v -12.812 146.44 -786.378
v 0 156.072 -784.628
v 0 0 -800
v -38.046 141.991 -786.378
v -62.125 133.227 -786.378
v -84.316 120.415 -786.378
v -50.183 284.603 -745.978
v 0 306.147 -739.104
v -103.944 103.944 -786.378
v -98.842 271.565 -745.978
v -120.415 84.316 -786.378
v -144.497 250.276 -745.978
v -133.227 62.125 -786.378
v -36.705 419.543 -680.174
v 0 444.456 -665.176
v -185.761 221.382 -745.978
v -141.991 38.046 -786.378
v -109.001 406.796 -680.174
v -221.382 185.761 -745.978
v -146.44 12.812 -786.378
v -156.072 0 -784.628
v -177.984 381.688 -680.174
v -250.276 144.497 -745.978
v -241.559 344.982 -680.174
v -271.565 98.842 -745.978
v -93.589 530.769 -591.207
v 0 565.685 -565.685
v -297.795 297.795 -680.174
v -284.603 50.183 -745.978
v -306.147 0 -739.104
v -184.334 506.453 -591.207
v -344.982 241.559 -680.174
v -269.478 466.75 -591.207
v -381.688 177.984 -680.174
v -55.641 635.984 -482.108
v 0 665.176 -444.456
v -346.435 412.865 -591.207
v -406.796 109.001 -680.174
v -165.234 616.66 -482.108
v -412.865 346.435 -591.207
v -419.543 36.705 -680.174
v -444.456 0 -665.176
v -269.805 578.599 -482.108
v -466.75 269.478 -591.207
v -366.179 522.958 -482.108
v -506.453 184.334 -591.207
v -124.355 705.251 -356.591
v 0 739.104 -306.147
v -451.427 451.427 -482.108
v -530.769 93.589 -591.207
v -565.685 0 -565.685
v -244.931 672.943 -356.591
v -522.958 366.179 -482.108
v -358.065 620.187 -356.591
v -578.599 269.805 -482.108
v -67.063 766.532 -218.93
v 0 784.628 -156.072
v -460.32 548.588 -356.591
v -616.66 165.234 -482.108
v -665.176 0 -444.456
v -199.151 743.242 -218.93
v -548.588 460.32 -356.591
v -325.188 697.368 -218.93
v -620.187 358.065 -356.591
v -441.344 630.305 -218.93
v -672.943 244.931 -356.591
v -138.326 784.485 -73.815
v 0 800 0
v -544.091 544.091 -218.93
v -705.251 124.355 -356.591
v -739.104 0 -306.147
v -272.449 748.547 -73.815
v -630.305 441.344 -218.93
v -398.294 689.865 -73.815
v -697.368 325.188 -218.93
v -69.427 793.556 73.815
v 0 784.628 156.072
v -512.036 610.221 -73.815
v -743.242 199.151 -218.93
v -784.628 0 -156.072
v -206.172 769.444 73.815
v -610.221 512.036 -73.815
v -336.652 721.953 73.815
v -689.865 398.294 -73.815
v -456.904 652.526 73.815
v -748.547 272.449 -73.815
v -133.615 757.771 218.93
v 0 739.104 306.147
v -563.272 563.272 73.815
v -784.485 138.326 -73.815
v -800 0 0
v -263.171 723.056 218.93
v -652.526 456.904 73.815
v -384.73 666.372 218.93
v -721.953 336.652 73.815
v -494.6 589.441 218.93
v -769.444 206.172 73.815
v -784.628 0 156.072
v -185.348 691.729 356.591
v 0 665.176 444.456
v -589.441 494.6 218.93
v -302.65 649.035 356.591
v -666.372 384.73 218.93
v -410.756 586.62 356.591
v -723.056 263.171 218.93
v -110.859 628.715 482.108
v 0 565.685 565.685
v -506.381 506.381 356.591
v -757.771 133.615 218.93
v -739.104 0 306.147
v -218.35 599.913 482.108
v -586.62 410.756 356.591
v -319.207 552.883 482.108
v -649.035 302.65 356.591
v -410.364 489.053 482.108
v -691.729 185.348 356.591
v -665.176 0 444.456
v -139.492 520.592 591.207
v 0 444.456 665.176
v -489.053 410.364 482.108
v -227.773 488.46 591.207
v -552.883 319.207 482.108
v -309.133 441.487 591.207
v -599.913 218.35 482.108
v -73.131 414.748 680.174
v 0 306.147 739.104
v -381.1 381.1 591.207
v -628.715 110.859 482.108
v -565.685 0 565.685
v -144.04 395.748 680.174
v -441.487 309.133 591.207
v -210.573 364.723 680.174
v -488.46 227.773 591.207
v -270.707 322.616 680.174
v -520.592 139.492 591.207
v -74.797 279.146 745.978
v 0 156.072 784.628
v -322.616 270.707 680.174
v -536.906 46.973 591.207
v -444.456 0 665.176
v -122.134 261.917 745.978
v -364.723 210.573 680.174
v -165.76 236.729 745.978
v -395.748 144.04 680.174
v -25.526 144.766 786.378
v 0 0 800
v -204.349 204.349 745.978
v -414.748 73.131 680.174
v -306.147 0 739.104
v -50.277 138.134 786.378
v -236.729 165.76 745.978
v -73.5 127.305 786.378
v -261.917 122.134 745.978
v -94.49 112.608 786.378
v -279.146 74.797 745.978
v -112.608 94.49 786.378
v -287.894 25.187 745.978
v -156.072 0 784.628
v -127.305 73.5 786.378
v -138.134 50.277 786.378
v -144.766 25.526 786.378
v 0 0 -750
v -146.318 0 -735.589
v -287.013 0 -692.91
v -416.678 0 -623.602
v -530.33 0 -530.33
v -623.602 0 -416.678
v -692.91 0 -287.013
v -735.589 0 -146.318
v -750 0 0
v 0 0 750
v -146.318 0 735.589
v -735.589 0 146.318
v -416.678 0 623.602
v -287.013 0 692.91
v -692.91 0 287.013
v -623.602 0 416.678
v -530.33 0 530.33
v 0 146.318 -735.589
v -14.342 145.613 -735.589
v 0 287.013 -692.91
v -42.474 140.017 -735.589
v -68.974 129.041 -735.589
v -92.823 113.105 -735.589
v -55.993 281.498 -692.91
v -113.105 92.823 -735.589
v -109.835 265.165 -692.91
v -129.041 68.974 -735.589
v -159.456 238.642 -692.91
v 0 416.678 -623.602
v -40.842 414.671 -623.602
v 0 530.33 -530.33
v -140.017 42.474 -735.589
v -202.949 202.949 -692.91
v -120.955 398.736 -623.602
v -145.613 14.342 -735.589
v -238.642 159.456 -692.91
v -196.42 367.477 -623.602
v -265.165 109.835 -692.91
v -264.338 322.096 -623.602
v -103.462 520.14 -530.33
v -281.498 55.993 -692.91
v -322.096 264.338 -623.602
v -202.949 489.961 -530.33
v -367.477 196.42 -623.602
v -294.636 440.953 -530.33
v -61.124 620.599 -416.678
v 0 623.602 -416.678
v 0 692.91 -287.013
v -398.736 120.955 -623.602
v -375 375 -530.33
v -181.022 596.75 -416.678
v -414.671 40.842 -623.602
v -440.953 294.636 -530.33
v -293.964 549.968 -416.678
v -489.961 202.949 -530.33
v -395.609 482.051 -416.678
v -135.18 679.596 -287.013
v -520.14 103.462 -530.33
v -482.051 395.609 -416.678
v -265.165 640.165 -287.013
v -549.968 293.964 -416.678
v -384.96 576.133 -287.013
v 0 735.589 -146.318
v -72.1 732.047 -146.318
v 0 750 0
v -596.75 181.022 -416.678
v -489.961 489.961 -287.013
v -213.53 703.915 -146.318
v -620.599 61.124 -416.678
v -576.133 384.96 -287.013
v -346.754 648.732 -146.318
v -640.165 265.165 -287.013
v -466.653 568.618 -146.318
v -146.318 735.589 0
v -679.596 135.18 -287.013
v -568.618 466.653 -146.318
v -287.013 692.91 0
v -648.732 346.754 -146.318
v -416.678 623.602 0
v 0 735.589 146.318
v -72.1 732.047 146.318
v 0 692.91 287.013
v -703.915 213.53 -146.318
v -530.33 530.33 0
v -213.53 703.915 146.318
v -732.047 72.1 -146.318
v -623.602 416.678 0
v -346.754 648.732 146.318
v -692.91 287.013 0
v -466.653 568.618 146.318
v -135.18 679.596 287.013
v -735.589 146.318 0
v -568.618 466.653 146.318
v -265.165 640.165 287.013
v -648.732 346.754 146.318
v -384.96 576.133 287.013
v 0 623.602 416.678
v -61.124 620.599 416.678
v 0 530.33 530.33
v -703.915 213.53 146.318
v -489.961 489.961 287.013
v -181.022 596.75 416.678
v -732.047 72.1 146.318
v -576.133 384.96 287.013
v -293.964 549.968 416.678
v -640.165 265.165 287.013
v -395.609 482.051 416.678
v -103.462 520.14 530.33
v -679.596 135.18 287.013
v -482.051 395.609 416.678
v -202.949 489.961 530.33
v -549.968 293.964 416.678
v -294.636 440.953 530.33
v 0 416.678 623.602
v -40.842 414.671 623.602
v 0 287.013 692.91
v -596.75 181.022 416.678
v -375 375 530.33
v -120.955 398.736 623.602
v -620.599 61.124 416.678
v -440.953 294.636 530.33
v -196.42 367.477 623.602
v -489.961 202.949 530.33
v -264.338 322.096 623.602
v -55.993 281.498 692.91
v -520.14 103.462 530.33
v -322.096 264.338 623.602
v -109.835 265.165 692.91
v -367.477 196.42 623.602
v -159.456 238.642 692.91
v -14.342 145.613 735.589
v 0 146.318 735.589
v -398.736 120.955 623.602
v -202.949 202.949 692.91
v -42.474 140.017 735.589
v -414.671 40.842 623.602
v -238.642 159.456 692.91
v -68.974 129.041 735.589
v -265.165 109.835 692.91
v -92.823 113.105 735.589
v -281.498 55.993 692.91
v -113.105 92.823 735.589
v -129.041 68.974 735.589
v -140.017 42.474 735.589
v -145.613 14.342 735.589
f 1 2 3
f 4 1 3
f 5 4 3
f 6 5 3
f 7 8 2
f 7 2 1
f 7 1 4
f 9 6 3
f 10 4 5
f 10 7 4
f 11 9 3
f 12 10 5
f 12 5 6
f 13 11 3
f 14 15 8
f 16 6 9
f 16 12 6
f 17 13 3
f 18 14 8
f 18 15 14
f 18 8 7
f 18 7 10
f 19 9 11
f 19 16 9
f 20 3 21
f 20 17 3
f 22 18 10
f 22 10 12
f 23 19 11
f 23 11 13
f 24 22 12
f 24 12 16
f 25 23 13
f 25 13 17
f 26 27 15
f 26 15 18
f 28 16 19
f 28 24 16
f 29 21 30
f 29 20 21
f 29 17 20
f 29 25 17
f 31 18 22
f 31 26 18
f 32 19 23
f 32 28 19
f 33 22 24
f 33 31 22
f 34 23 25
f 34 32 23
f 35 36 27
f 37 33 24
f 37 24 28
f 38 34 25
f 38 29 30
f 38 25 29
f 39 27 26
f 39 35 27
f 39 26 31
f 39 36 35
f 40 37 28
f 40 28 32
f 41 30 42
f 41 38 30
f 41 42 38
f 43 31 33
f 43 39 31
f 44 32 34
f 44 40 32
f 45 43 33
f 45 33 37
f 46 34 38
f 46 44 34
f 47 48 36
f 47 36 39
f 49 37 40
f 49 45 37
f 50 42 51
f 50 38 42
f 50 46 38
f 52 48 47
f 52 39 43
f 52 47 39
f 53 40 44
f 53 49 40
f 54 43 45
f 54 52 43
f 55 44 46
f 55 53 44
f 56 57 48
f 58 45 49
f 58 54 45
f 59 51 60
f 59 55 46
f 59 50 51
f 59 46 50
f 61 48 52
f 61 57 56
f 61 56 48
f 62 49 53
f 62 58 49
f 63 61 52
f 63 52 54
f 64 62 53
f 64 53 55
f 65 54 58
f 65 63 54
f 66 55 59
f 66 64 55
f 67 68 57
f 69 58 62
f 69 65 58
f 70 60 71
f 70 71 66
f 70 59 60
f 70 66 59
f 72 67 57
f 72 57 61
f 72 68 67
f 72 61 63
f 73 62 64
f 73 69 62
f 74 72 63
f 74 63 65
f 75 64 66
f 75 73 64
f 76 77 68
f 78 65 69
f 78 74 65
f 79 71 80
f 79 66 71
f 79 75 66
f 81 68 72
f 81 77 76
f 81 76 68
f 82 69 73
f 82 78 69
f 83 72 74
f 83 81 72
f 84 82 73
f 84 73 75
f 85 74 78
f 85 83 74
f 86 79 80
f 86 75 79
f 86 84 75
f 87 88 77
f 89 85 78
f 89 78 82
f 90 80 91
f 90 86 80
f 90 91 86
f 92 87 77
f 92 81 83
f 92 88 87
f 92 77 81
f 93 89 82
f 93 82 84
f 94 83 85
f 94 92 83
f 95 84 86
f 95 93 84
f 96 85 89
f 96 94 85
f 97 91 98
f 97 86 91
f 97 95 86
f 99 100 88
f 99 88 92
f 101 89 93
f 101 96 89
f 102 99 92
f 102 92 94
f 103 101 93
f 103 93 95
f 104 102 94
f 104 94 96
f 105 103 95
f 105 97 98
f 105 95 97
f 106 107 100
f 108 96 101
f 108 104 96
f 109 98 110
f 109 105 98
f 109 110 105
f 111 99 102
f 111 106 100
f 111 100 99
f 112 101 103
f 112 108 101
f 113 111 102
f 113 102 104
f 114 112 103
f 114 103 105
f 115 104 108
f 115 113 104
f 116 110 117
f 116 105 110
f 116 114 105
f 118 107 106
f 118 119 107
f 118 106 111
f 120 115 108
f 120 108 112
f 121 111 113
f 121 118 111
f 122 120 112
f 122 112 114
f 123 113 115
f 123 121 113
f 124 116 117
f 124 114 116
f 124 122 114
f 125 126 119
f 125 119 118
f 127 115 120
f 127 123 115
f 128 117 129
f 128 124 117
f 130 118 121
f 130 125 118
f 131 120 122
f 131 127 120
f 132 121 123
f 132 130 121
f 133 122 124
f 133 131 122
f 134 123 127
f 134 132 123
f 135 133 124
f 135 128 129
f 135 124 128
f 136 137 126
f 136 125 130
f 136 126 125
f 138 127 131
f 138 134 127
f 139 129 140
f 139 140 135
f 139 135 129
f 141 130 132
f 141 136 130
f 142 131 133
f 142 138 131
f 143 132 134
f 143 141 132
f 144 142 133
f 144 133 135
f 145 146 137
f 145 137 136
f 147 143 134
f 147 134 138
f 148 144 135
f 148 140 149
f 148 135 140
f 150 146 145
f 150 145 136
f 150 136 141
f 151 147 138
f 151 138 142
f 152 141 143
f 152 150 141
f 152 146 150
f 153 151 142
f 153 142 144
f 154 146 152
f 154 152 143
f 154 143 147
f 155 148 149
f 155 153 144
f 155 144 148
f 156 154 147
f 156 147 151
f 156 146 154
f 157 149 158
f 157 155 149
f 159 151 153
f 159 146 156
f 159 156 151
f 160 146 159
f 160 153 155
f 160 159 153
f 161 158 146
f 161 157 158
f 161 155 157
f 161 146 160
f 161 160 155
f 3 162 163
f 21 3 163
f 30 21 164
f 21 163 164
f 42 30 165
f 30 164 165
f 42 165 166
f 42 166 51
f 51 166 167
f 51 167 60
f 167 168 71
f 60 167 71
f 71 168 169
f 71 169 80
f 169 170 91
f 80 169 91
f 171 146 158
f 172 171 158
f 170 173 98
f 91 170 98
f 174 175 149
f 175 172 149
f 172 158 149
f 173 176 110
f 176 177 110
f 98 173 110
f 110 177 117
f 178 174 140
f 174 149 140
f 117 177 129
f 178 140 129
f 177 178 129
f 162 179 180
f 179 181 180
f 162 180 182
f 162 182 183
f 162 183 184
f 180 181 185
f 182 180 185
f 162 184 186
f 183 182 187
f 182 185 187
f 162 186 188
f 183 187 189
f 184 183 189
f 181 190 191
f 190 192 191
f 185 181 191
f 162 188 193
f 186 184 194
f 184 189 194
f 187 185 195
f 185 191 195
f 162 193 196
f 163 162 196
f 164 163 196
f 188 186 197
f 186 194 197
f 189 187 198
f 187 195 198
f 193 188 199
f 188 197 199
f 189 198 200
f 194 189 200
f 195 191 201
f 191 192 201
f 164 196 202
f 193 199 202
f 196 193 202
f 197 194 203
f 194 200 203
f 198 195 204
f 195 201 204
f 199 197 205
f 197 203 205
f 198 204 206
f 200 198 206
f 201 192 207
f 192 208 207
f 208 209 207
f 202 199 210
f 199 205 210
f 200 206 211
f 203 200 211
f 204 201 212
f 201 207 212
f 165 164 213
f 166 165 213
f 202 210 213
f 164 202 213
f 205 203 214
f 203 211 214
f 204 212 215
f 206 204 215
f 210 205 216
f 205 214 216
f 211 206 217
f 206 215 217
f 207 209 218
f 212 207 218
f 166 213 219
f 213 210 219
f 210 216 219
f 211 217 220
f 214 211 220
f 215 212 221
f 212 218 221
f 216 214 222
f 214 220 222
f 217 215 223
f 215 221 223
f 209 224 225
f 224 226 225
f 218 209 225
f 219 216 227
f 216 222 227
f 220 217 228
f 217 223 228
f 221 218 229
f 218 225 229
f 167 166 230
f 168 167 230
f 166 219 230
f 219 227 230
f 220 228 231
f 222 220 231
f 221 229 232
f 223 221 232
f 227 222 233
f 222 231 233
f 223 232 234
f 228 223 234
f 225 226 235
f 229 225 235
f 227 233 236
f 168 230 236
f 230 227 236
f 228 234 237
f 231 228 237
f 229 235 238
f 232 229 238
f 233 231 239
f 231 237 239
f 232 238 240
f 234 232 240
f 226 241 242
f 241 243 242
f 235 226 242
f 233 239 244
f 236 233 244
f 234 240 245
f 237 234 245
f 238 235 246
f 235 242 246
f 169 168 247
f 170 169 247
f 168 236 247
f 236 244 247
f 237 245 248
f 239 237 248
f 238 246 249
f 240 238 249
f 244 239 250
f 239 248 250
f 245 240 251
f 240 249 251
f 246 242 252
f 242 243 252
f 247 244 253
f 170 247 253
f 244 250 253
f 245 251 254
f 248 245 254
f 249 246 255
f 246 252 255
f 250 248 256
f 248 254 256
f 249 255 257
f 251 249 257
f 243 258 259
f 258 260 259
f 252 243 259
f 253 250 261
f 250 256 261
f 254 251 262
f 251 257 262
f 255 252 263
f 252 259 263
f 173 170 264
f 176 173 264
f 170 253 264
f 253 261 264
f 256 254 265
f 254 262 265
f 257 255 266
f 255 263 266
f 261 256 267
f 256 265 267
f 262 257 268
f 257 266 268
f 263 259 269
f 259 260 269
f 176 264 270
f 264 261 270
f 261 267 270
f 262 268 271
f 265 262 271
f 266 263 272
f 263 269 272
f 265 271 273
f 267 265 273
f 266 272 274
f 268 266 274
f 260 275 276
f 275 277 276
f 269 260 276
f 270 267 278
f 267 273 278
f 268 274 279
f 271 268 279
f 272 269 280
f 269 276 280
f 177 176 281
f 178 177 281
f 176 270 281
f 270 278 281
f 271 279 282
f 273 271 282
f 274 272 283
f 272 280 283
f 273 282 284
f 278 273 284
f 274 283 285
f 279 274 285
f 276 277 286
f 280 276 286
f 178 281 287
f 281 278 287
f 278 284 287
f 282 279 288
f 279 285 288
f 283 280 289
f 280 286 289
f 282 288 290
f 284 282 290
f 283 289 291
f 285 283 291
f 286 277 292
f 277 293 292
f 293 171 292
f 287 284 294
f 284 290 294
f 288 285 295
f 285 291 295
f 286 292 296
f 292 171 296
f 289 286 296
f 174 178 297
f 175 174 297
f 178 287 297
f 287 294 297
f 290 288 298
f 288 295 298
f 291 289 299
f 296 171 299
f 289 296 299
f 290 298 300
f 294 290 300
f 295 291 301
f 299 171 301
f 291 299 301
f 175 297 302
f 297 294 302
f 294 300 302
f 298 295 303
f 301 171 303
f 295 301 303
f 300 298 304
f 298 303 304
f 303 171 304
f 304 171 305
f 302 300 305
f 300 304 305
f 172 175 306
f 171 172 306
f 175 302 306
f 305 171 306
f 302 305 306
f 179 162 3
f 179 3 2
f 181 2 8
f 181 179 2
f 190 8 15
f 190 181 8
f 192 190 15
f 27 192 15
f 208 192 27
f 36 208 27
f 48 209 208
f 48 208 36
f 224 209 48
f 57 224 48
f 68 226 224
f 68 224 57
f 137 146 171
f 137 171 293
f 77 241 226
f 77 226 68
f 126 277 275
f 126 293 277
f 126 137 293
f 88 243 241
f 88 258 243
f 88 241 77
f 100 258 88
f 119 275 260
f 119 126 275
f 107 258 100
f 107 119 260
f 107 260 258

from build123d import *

# Parameters (mm, degrees)
SPHERE001_ANGLE           = 90
SPHERE001_PLACEMENT_ANGLE = 90
SPHERE_ANGLE              = 90
SPHERE_PLACEMENT_ANGLE    = 90


with BuildPart() as sphere001:
    # Sphere001 → Sphere001 (revolve)
    with BuildSketch(Plane.XZ):
        with BuildLine():
            ThreePointArc((0, -750), (750, 0), (0, 750))
            Line((0, 750), (0, -750))
        make_face()
    revolve(axis=Axis((0, 0, 0), (0, 0, 1)), revolution_arc=SPHERE001_ANGLE)


with BuildPart() as sphere001_1:
    # Sphere001 placement: moved
    add(sphere001.part.rotate(Axis((0, 0, 0), (0, 0, 1)), SPHERE001_PLACEMENT_ANGLE))


with BuildPart() as cut:
    # Sphere → Sphere (revolve)
    with BuildSketch(Plane.XZ):
        with BuildLine():
            ThreePointArc((0, -800), (800, 0), (0, 800))
            Line((0, 800), (0, -800))
        make_face()
    revolve(axis=Axis((0, 0, 0), (0, 0, 1)), revolution_arc=SPHERE_ANGLE)


with BuildPart() as cut_1:
    # Sphere placement: moved
    add(cut.part.rotate(Axis((0, 0, 0), (0, 0, 1)), SPHERE_PLACEMENT_ANGLE))

    # Cut: cut Sphere001
    add(sphere001_1.part, mode=Mode.SUBTRACT)


solid = cut_1.part
